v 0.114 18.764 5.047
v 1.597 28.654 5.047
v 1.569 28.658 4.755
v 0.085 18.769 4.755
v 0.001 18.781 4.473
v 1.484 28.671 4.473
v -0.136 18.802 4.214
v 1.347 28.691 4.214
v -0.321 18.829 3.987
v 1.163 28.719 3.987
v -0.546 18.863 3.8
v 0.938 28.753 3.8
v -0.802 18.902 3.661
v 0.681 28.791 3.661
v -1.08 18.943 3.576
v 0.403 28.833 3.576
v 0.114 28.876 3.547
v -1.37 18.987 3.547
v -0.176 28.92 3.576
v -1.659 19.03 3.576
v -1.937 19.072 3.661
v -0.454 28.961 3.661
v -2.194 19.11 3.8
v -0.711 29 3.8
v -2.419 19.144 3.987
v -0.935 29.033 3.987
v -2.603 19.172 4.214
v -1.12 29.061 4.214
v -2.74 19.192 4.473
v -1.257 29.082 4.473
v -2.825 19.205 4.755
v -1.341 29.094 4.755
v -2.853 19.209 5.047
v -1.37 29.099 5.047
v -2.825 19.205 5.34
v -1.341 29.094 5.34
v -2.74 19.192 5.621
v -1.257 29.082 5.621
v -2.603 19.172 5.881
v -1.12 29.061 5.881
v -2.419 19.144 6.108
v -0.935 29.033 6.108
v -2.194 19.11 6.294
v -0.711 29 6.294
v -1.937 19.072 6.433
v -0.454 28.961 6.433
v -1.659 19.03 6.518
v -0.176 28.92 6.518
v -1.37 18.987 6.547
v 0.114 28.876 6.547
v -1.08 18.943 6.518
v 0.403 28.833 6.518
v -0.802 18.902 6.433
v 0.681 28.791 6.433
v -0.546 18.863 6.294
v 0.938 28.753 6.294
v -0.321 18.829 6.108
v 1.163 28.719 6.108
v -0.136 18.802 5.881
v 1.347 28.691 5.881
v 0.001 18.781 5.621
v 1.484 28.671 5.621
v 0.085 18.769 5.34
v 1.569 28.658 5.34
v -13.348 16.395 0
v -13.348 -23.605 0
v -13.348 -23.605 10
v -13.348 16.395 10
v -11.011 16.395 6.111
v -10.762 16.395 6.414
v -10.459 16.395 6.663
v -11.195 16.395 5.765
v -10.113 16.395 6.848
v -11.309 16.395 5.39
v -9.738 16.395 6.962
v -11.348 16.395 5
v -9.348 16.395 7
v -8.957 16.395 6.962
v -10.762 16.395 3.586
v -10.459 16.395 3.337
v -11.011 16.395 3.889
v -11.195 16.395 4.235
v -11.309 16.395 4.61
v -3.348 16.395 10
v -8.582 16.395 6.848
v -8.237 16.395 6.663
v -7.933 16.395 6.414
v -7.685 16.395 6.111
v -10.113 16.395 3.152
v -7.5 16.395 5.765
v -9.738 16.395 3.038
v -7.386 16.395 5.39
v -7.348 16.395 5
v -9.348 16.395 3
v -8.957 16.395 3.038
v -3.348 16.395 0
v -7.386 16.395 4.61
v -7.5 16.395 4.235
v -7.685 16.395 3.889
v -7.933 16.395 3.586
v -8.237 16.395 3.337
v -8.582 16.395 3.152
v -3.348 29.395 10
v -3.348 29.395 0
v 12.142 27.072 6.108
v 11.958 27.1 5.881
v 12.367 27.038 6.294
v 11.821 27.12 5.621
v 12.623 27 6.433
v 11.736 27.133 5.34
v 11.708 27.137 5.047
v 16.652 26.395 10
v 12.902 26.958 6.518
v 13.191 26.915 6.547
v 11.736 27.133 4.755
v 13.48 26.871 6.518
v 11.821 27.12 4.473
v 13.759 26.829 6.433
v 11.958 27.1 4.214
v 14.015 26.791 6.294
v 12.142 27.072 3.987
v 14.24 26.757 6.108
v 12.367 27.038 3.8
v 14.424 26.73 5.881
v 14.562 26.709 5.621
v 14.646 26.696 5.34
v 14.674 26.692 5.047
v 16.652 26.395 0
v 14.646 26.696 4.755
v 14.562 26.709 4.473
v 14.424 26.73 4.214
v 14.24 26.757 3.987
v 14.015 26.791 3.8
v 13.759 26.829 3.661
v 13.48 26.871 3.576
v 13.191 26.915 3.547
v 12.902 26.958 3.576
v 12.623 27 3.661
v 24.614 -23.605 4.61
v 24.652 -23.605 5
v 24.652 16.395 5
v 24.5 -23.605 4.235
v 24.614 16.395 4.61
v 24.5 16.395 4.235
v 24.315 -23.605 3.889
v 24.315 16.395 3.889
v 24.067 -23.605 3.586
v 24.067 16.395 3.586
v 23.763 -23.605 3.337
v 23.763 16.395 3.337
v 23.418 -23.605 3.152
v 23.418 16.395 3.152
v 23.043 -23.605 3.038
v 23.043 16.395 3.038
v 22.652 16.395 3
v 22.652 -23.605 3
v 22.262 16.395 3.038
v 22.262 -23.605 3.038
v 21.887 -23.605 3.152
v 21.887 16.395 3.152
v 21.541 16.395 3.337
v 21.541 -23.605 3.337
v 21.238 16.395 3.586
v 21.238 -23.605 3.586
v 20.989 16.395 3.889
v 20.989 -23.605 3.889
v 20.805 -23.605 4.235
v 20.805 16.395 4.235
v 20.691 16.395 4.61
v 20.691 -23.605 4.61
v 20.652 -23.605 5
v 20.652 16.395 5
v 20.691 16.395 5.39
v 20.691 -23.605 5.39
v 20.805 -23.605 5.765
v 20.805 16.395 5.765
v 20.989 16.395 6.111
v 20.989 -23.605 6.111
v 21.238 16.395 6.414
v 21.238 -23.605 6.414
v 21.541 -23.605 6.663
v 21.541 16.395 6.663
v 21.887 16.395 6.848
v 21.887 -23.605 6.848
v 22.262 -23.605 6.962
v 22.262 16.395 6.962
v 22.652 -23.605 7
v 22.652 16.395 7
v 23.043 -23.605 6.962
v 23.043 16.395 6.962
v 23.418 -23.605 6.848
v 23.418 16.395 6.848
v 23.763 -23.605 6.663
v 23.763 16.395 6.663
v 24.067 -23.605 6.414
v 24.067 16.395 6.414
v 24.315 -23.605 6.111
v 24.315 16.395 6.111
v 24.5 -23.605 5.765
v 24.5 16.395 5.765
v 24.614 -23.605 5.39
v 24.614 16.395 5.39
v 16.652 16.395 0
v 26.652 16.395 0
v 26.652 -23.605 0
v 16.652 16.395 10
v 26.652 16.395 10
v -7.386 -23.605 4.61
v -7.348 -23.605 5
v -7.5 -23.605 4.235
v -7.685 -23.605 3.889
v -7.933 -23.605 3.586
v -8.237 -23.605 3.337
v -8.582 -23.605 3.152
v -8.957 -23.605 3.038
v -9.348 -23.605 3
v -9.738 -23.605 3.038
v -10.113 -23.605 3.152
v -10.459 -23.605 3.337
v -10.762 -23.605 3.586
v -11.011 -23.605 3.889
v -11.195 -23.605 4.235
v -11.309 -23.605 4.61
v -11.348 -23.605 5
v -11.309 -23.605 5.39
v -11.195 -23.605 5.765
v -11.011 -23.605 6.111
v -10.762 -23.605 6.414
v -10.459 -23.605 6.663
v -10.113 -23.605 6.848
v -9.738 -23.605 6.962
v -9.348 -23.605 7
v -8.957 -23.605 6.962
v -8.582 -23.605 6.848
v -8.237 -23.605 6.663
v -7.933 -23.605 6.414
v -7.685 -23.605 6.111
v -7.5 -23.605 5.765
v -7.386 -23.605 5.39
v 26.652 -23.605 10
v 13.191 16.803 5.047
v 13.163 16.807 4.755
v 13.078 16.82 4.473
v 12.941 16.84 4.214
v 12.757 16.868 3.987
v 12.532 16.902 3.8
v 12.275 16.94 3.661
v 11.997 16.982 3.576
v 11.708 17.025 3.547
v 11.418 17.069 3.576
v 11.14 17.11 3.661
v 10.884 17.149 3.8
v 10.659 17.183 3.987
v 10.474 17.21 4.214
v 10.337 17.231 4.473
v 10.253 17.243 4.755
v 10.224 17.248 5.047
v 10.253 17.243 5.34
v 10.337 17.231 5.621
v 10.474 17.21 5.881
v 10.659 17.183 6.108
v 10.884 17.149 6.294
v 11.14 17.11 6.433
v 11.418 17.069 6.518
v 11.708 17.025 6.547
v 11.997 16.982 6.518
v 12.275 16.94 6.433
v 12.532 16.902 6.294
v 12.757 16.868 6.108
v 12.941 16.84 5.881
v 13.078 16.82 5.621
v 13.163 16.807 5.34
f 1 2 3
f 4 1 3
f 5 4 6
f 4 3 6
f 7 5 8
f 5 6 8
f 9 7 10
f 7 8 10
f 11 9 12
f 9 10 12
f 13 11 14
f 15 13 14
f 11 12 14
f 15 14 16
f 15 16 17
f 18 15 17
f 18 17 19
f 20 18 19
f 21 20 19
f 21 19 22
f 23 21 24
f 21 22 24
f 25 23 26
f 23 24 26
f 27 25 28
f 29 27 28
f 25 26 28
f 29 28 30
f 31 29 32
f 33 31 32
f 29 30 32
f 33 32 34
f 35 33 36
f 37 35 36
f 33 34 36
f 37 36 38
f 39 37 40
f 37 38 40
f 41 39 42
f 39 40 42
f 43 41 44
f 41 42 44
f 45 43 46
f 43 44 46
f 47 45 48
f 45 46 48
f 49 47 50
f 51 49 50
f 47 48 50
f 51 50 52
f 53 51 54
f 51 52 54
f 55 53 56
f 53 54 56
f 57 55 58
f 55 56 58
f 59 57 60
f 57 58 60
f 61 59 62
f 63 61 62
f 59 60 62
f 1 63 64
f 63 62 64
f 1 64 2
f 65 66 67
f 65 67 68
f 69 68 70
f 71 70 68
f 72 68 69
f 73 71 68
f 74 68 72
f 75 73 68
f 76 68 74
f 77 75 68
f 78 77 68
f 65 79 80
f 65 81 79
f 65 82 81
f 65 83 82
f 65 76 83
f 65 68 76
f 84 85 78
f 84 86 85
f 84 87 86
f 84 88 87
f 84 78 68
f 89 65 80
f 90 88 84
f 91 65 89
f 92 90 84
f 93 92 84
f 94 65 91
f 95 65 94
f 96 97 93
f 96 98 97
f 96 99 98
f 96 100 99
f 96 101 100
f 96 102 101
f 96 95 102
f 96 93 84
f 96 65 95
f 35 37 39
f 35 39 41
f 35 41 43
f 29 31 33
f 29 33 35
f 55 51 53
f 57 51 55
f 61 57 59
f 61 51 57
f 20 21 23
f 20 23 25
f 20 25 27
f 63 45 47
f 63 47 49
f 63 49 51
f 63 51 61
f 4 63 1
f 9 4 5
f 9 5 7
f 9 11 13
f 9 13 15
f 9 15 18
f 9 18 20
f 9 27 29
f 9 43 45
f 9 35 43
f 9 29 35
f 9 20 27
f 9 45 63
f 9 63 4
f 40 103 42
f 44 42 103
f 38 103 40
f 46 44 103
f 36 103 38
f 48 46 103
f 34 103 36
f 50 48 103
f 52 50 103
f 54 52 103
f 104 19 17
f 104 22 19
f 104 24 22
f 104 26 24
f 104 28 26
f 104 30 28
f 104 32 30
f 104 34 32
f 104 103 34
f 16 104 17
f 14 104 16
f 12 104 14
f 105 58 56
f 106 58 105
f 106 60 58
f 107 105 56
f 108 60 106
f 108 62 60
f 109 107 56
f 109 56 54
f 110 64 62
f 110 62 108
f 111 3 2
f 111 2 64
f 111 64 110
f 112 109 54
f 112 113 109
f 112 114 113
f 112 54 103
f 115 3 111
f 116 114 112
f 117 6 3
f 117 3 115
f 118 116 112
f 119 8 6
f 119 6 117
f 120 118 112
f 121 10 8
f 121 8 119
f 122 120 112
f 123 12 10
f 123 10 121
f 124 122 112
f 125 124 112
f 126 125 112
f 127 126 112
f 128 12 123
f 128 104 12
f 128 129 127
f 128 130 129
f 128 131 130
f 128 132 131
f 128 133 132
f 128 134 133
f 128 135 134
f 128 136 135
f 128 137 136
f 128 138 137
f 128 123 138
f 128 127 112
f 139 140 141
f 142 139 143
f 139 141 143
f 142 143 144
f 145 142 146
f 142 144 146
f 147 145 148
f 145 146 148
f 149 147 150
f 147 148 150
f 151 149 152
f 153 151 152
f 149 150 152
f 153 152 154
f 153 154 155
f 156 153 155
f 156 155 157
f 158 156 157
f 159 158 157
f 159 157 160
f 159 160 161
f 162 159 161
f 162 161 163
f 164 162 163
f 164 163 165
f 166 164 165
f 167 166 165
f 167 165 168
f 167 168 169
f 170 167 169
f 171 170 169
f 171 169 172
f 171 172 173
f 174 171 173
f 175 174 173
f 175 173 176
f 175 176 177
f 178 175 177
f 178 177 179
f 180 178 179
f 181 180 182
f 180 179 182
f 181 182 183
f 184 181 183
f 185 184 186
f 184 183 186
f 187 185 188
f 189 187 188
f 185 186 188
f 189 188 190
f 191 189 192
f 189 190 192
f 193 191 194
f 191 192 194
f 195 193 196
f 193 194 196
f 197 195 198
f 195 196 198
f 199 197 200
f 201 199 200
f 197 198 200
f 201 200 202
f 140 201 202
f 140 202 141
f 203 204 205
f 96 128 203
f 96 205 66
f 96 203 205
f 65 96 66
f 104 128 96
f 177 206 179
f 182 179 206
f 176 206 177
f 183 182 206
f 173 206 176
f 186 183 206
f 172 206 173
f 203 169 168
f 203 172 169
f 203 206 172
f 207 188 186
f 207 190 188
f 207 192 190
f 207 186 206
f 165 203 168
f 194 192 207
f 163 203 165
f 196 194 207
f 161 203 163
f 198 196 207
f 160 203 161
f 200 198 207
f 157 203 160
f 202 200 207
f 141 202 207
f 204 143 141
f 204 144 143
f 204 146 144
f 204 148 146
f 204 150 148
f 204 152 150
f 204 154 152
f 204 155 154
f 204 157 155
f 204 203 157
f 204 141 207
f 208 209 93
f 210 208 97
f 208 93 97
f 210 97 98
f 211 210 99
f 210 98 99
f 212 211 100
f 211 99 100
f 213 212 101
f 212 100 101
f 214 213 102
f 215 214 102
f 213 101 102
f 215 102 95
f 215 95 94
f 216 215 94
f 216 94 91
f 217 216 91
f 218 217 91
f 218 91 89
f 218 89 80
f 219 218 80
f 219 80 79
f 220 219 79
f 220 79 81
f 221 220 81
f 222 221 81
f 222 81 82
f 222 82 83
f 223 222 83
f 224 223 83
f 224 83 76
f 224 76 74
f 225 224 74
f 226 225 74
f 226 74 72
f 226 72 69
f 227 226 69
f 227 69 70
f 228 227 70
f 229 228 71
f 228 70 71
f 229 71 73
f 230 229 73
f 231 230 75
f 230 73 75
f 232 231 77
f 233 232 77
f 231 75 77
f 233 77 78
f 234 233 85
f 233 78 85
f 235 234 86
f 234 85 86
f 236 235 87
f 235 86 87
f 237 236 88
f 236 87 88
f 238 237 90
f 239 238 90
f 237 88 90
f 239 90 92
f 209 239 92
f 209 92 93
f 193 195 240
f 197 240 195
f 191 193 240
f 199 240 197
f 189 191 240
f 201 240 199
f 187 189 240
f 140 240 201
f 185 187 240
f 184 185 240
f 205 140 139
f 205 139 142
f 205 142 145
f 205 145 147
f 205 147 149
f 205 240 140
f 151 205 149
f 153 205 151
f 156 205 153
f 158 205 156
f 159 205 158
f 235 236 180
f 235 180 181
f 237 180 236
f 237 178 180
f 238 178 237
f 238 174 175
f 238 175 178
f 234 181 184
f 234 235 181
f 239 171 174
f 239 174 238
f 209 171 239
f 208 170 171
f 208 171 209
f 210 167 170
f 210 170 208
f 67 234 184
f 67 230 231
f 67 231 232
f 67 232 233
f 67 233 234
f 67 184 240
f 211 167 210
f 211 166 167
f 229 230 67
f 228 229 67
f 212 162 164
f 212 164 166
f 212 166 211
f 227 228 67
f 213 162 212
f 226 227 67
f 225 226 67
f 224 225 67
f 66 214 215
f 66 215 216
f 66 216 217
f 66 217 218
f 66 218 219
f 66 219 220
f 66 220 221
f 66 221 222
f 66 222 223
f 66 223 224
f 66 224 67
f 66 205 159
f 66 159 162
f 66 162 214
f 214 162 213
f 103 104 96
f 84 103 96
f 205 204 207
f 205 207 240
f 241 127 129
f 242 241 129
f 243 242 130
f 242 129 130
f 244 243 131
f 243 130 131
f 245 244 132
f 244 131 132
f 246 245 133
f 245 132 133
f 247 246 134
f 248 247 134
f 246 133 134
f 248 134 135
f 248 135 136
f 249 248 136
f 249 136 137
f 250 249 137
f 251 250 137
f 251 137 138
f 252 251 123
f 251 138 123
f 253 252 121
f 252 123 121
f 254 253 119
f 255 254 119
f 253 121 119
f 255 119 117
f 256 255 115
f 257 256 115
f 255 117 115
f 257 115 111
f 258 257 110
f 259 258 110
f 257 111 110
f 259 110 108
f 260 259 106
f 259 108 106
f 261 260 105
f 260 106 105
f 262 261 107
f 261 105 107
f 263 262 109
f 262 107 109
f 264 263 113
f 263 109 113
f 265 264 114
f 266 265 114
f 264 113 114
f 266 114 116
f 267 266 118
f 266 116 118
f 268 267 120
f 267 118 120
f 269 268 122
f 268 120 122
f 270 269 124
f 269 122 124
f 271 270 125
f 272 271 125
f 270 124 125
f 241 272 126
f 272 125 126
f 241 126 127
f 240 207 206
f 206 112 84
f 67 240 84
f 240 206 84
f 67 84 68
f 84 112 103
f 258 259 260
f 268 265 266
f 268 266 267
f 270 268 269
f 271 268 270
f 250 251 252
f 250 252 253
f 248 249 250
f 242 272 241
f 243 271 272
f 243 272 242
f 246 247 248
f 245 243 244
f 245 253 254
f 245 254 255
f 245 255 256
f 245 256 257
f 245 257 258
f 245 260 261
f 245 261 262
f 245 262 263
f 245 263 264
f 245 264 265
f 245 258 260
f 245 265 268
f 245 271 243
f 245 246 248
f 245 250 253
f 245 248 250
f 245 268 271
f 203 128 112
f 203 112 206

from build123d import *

# Parameters (mm, degrees)
BOSS_EXTRU_1_DEPTH      = 10
ESQUISSE4_R             = 1.5
ENL_V_MAT_EXTRU_3_DEPTH = 10
ESQUISSE2_R             = 2
ENL_V_MAT_EXTRU_4_DEPTH = 50


with BuildPart() as part:
    # Esquisse1 → Boss.-Extru.1 (new body)
    with BuildSketch(Plane.XY):
        Polygon((-13.347674419, 16.395348837), (-3.347674419, 16.395348837), (-3.347674419, 26.395348837), (-3.347674419, 29.395348837), (16.652325581, 26.395348837), (16.652325581, 16.395348837), (26.652325581, 16.395348837), (26.652325581, -23.604651163), (-13.347674419, -23.604651163), align=None)
    extrude(amount=BOSS_EXTRU_1_DEPTH)

    # Esquisse4 → Enlèv. mat.-Extru.3 (cut)
    with BuildSketch(Plane(origin=(4.238610906, 28.257406039, 0), x_dir=(0.988936353, -0.148340453, 0), z_dir=(0.148340453, 0.988936353, 0))):
        with Locations((-4.171156291, -5.047200532)):
            Circle(ESQUISSE4_R)
        with Locations((9.052592125, -5.047200532)):
            Circle(ESQUISSE4_R)
    extrude(amount=-ENL_V_MAT_EXTRU_3_DEPTH, mode=Mode.SUBTRACT)

    # Esquisse2 → Enlèv. mat.-Extru.4 (cut)
    with BuildSketch(Plane(origin=(0, 16.395348837, 0), x_dir=(1, 0, 0), z_dir=(0, 1, 0))):
        with Locations((22.652325581, -5)):
            Circle(ESQUISSE2_R)
        with Locations((-9.347674419, -5)):
            Circle(ESQUISSE2_R)
    extrude(amount=-ENL_V_MAT_EXTRU_4_DEPTH, mode=Mode.SUBTRACT)


solid = part.part
